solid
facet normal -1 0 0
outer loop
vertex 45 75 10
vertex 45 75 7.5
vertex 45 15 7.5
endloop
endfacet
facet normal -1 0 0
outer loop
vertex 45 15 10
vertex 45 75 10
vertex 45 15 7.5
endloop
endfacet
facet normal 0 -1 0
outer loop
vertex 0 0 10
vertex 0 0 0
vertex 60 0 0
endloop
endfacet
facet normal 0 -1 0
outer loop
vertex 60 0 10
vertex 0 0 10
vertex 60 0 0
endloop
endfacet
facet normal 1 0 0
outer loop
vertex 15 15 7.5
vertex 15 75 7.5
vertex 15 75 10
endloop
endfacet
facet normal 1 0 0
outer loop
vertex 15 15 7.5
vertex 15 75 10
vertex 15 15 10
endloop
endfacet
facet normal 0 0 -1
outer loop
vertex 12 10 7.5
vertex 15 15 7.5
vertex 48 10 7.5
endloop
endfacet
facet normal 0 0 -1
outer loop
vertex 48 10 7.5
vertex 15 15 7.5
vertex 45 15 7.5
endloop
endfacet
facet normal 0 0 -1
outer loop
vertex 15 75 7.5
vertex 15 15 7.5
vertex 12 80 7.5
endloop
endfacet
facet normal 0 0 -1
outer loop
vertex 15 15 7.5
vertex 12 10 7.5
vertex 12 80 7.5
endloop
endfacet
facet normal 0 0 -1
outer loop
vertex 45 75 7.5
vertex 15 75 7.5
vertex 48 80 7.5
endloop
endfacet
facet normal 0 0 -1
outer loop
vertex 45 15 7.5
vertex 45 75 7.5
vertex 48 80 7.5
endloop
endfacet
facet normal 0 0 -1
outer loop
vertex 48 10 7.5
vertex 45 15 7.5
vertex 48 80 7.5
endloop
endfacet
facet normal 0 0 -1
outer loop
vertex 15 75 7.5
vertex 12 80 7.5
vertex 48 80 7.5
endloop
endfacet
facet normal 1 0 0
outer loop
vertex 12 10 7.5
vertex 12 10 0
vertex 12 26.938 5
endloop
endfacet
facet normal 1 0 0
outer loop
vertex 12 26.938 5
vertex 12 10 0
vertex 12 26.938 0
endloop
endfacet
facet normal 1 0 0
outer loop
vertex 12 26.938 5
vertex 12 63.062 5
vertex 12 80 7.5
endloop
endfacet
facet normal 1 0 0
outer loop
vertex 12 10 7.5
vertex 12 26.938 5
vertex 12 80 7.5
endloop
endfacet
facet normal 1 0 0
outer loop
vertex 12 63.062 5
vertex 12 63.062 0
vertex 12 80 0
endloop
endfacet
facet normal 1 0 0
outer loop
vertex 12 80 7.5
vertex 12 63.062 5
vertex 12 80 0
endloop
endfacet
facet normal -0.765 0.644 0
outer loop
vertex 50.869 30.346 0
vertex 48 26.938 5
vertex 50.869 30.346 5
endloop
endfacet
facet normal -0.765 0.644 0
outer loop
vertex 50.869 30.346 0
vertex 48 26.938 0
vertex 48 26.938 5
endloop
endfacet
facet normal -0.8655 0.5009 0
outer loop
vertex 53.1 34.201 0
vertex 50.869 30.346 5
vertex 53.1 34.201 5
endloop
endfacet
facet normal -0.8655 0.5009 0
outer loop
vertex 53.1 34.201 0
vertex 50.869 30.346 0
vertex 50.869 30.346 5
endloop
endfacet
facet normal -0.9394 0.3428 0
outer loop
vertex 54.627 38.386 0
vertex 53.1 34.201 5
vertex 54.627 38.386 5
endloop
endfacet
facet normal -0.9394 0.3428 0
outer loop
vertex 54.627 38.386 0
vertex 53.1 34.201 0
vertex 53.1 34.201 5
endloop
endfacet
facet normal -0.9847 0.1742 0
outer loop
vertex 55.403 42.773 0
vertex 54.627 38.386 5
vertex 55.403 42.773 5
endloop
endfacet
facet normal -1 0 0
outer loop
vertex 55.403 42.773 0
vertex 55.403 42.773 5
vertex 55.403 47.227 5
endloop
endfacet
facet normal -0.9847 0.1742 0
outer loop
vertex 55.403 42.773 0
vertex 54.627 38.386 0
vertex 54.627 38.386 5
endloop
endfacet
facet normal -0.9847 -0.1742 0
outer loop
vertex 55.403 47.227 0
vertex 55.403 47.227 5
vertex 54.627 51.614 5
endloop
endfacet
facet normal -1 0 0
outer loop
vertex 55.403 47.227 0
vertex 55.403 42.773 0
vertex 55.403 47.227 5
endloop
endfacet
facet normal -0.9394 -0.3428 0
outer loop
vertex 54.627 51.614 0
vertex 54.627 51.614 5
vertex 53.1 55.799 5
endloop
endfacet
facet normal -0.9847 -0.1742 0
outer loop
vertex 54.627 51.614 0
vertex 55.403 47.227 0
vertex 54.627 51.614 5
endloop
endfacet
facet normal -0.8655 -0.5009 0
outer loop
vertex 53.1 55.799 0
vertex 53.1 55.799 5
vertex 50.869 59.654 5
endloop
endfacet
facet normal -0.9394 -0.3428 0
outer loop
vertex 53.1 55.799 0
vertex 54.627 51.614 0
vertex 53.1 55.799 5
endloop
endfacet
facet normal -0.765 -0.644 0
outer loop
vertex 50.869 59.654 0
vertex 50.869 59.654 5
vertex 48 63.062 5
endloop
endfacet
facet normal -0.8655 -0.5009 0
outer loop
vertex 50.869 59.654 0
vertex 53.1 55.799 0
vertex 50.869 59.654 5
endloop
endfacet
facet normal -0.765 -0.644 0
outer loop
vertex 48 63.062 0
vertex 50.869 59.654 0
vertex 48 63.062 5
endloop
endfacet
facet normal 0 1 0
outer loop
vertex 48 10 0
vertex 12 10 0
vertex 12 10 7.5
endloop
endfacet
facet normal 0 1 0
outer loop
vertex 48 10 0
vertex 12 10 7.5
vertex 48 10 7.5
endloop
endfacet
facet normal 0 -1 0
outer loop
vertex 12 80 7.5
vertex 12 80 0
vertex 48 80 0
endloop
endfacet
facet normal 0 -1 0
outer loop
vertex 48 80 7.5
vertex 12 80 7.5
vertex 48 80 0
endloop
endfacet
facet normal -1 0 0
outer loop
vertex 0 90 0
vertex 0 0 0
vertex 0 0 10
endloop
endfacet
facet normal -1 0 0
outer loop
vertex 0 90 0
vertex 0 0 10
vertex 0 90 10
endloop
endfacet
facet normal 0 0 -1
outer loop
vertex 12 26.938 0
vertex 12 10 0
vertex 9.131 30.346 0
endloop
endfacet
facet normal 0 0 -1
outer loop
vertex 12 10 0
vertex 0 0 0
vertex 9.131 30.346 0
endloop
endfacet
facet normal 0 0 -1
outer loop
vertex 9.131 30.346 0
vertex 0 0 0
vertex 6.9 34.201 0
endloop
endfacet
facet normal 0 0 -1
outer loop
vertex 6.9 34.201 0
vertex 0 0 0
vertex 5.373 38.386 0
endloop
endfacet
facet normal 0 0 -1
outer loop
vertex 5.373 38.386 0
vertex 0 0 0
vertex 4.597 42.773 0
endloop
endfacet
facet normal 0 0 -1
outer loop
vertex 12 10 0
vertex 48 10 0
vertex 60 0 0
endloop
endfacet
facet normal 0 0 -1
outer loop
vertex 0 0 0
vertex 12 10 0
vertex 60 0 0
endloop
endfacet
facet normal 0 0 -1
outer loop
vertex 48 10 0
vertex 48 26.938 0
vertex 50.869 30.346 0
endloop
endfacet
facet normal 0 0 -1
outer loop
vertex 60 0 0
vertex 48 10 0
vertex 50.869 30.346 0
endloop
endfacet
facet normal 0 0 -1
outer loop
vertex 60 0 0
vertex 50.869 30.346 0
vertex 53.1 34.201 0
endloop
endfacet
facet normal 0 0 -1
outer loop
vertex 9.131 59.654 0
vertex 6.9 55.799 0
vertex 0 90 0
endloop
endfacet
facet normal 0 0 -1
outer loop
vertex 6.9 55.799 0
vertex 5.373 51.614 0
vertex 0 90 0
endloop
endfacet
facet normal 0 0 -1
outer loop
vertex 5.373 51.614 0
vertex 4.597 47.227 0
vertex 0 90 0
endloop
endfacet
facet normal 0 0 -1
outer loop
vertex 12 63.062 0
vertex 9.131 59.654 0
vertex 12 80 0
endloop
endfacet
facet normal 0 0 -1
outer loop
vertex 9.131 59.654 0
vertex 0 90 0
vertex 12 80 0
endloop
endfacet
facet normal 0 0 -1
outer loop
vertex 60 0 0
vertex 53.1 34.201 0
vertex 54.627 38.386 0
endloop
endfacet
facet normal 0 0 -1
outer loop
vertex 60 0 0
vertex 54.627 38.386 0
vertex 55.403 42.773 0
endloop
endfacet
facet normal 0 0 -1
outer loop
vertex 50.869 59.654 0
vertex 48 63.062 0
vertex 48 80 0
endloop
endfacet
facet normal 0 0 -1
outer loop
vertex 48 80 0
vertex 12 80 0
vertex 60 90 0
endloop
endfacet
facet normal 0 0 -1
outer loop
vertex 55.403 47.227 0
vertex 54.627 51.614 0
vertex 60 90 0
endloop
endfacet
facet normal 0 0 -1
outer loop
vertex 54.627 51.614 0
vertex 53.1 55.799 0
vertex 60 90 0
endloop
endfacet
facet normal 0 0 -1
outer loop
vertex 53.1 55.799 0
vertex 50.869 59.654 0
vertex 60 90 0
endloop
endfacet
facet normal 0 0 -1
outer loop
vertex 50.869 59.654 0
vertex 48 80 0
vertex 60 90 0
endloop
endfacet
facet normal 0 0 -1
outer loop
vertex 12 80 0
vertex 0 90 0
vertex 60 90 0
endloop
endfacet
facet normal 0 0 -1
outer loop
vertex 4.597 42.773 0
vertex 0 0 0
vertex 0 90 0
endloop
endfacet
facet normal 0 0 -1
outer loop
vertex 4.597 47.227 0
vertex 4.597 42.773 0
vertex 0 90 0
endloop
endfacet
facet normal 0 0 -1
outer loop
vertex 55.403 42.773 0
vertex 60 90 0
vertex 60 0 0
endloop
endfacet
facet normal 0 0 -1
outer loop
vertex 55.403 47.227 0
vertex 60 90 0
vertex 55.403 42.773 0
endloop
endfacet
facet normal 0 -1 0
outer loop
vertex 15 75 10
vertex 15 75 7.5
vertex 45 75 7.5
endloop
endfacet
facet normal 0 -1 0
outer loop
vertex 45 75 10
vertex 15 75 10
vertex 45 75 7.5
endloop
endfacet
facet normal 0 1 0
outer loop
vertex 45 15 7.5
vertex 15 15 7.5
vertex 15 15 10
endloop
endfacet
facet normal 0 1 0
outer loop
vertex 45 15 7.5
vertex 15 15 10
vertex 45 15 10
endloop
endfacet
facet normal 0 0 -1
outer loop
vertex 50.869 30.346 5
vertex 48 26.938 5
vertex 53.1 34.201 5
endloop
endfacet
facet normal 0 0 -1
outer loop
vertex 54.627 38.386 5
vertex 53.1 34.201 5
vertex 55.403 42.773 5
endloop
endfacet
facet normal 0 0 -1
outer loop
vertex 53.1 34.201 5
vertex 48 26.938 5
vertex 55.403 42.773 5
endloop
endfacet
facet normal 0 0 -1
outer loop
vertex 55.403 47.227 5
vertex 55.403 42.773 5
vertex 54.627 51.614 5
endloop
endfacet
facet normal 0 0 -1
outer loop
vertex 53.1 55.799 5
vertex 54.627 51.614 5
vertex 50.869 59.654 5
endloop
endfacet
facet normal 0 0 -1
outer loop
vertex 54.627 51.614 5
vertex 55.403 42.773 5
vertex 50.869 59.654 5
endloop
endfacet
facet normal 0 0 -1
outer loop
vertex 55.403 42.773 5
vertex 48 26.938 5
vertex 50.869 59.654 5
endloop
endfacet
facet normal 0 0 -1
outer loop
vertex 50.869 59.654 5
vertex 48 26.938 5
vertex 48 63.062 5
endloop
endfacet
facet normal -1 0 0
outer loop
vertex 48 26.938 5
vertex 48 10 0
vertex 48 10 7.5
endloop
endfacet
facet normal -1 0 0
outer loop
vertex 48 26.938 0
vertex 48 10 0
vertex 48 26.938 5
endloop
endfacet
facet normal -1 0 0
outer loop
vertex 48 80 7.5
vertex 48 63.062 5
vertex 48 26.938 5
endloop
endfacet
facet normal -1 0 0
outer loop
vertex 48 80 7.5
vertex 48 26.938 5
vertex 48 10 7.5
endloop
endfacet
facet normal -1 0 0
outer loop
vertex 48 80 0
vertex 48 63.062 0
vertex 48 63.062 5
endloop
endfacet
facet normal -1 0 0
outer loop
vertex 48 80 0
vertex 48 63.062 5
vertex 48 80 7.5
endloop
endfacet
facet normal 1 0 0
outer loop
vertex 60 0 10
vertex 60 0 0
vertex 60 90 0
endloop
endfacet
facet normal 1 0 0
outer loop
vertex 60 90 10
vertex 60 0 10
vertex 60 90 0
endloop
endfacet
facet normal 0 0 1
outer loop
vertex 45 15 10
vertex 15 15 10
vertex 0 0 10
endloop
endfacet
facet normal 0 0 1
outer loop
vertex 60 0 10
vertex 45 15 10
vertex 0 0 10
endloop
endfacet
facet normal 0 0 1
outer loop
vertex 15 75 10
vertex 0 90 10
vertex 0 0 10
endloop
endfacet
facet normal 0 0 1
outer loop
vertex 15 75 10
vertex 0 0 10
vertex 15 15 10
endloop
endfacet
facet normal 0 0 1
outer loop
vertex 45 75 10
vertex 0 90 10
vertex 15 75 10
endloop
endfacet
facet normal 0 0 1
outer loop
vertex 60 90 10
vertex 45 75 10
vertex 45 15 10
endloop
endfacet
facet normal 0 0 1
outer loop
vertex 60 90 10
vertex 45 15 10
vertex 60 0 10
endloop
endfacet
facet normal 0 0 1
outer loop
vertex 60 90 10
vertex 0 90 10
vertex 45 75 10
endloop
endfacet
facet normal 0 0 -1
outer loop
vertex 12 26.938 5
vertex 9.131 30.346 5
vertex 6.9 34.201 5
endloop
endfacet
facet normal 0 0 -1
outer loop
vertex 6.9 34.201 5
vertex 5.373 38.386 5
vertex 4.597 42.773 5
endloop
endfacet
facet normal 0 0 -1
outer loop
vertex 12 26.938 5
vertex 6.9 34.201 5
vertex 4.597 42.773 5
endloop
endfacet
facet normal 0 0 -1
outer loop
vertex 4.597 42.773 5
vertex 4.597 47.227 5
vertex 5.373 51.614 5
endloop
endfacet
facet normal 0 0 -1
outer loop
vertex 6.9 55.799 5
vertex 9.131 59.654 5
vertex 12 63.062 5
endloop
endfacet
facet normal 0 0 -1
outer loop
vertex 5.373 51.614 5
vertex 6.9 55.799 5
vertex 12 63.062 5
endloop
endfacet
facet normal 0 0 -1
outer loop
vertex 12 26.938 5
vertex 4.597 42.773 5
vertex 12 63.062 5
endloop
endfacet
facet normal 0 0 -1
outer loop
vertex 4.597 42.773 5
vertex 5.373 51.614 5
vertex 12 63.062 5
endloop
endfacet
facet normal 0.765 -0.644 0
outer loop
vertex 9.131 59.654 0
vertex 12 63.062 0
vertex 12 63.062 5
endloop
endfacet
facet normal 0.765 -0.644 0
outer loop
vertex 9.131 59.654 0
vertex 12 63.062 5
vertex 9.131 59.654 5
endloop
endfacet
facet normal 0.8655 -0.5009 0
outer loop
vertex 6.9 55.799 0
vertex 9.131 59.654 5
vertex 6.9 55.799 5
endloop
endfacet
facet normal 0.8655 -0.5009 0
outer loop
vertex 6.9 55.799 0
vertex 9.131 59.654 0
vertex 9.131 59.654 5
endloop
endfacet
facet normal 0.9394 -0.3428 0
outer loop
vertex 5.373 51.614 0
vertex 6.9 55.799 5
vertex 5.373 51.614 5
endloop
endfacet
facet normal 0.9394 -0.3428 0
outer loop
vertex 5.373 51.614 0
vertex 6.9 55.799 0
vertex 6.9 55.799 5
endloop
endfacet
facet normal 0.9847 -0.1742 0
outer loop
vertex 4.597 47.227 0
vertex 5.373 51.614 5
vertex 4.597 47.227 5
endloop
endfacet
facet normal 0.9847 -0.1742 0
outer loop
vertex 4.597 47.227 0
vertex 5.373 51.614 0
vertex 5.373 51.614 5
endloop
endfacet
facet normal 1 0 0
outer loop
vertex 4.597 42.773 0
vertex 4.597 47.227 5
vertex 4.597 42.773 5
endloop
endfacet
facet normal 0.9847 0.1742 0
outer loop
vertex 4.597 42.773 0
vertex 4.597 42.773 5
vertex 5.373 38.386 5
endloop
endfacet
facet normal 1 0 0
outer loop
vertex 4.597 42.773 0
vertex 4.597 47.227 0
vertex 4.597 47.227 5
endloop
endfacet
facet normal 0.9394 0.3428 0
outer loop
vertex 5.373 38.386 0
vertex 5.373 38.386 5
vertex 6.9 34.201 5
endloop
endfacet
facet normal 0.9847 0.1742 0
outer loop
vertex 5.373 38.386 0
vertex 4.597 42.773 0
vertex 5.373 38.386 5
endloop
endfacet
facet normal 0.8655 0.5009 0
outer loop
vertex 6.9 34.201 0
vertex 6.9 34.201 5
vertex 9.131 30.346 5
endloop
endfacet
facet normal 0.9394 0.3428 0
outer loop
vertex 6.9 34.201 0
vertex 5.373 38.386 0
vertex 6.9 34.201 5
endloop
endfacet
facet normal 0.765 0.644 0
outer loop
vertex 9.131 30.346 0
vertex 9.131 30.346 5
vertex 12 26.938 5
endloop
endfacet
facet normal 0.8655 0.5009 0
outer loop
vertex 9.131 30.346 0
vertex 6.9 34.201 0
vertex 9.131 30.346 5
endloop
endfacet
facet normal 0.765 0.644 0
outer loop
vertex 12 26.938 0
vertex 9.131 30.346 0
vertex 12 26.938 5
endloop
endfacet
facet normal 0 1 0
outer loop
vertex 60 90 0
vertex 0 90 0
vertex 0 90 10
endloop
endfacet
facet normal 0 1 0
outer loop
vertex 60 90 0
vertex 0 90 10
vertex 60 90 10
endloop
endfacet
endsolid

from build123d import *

# Parameters (mm, degrees)
SKETCH_W        = 60
SKETCH_H        = 90
PAD_DEPTH       = 10
SKETCH001_W     = 30
SKETCH001_H     = 60
POCKET_DEPTH    = 10.001
SKETCH002_W     = 36
SKETCH002_H     = 70
POCKET001_DEPTH = 7.5
SKETCH003_R     = 25.5
POCKET002_DEPTH = 5


with BuildPart() as part:
    # Sketch → Pad (new body)
    with BuildSketch(Plane.XY):
        with Locations((30, 45)):
            Rectangle(SKETCH_W, SKETCH_H)
    extrude(amount=PAD_DEPTH)

    # Sketch001 (on Face5 of Pad) → Pocket (cut, through all)
    with BuildSketch(Plane(origin=(0, 0, 0), x_dir=(1, 0, 0), z_dir=(0, 0, -1))):
        with Locations((30, -45)):
            Rectangle(SKETCH001_W, SKETCH001_H)
    extrude(amount=-POCKET_DEPTH, mode=Mode.SUBTRACT)

    # Sketch002 → Pocket001 (cut)
    with BuildSketch(Plane.XY):
        with Locations((30, 45)):
            Rectangle(SKETCH002_W, SKETCH002_H)
    extrude(amount=POCKET001_DEPTH, mode=Mode.SUBTRACT)

    # Sketch003 → Pocket002 (cut)
    with BuildSketch(Plane.XY):
        with Locations((30, 45)):
            Circle(SKETCH003_R)
    extrude(amount=POCKET002_DEPTH, mode=Mode.SUBTRACT)


solid = part.part
